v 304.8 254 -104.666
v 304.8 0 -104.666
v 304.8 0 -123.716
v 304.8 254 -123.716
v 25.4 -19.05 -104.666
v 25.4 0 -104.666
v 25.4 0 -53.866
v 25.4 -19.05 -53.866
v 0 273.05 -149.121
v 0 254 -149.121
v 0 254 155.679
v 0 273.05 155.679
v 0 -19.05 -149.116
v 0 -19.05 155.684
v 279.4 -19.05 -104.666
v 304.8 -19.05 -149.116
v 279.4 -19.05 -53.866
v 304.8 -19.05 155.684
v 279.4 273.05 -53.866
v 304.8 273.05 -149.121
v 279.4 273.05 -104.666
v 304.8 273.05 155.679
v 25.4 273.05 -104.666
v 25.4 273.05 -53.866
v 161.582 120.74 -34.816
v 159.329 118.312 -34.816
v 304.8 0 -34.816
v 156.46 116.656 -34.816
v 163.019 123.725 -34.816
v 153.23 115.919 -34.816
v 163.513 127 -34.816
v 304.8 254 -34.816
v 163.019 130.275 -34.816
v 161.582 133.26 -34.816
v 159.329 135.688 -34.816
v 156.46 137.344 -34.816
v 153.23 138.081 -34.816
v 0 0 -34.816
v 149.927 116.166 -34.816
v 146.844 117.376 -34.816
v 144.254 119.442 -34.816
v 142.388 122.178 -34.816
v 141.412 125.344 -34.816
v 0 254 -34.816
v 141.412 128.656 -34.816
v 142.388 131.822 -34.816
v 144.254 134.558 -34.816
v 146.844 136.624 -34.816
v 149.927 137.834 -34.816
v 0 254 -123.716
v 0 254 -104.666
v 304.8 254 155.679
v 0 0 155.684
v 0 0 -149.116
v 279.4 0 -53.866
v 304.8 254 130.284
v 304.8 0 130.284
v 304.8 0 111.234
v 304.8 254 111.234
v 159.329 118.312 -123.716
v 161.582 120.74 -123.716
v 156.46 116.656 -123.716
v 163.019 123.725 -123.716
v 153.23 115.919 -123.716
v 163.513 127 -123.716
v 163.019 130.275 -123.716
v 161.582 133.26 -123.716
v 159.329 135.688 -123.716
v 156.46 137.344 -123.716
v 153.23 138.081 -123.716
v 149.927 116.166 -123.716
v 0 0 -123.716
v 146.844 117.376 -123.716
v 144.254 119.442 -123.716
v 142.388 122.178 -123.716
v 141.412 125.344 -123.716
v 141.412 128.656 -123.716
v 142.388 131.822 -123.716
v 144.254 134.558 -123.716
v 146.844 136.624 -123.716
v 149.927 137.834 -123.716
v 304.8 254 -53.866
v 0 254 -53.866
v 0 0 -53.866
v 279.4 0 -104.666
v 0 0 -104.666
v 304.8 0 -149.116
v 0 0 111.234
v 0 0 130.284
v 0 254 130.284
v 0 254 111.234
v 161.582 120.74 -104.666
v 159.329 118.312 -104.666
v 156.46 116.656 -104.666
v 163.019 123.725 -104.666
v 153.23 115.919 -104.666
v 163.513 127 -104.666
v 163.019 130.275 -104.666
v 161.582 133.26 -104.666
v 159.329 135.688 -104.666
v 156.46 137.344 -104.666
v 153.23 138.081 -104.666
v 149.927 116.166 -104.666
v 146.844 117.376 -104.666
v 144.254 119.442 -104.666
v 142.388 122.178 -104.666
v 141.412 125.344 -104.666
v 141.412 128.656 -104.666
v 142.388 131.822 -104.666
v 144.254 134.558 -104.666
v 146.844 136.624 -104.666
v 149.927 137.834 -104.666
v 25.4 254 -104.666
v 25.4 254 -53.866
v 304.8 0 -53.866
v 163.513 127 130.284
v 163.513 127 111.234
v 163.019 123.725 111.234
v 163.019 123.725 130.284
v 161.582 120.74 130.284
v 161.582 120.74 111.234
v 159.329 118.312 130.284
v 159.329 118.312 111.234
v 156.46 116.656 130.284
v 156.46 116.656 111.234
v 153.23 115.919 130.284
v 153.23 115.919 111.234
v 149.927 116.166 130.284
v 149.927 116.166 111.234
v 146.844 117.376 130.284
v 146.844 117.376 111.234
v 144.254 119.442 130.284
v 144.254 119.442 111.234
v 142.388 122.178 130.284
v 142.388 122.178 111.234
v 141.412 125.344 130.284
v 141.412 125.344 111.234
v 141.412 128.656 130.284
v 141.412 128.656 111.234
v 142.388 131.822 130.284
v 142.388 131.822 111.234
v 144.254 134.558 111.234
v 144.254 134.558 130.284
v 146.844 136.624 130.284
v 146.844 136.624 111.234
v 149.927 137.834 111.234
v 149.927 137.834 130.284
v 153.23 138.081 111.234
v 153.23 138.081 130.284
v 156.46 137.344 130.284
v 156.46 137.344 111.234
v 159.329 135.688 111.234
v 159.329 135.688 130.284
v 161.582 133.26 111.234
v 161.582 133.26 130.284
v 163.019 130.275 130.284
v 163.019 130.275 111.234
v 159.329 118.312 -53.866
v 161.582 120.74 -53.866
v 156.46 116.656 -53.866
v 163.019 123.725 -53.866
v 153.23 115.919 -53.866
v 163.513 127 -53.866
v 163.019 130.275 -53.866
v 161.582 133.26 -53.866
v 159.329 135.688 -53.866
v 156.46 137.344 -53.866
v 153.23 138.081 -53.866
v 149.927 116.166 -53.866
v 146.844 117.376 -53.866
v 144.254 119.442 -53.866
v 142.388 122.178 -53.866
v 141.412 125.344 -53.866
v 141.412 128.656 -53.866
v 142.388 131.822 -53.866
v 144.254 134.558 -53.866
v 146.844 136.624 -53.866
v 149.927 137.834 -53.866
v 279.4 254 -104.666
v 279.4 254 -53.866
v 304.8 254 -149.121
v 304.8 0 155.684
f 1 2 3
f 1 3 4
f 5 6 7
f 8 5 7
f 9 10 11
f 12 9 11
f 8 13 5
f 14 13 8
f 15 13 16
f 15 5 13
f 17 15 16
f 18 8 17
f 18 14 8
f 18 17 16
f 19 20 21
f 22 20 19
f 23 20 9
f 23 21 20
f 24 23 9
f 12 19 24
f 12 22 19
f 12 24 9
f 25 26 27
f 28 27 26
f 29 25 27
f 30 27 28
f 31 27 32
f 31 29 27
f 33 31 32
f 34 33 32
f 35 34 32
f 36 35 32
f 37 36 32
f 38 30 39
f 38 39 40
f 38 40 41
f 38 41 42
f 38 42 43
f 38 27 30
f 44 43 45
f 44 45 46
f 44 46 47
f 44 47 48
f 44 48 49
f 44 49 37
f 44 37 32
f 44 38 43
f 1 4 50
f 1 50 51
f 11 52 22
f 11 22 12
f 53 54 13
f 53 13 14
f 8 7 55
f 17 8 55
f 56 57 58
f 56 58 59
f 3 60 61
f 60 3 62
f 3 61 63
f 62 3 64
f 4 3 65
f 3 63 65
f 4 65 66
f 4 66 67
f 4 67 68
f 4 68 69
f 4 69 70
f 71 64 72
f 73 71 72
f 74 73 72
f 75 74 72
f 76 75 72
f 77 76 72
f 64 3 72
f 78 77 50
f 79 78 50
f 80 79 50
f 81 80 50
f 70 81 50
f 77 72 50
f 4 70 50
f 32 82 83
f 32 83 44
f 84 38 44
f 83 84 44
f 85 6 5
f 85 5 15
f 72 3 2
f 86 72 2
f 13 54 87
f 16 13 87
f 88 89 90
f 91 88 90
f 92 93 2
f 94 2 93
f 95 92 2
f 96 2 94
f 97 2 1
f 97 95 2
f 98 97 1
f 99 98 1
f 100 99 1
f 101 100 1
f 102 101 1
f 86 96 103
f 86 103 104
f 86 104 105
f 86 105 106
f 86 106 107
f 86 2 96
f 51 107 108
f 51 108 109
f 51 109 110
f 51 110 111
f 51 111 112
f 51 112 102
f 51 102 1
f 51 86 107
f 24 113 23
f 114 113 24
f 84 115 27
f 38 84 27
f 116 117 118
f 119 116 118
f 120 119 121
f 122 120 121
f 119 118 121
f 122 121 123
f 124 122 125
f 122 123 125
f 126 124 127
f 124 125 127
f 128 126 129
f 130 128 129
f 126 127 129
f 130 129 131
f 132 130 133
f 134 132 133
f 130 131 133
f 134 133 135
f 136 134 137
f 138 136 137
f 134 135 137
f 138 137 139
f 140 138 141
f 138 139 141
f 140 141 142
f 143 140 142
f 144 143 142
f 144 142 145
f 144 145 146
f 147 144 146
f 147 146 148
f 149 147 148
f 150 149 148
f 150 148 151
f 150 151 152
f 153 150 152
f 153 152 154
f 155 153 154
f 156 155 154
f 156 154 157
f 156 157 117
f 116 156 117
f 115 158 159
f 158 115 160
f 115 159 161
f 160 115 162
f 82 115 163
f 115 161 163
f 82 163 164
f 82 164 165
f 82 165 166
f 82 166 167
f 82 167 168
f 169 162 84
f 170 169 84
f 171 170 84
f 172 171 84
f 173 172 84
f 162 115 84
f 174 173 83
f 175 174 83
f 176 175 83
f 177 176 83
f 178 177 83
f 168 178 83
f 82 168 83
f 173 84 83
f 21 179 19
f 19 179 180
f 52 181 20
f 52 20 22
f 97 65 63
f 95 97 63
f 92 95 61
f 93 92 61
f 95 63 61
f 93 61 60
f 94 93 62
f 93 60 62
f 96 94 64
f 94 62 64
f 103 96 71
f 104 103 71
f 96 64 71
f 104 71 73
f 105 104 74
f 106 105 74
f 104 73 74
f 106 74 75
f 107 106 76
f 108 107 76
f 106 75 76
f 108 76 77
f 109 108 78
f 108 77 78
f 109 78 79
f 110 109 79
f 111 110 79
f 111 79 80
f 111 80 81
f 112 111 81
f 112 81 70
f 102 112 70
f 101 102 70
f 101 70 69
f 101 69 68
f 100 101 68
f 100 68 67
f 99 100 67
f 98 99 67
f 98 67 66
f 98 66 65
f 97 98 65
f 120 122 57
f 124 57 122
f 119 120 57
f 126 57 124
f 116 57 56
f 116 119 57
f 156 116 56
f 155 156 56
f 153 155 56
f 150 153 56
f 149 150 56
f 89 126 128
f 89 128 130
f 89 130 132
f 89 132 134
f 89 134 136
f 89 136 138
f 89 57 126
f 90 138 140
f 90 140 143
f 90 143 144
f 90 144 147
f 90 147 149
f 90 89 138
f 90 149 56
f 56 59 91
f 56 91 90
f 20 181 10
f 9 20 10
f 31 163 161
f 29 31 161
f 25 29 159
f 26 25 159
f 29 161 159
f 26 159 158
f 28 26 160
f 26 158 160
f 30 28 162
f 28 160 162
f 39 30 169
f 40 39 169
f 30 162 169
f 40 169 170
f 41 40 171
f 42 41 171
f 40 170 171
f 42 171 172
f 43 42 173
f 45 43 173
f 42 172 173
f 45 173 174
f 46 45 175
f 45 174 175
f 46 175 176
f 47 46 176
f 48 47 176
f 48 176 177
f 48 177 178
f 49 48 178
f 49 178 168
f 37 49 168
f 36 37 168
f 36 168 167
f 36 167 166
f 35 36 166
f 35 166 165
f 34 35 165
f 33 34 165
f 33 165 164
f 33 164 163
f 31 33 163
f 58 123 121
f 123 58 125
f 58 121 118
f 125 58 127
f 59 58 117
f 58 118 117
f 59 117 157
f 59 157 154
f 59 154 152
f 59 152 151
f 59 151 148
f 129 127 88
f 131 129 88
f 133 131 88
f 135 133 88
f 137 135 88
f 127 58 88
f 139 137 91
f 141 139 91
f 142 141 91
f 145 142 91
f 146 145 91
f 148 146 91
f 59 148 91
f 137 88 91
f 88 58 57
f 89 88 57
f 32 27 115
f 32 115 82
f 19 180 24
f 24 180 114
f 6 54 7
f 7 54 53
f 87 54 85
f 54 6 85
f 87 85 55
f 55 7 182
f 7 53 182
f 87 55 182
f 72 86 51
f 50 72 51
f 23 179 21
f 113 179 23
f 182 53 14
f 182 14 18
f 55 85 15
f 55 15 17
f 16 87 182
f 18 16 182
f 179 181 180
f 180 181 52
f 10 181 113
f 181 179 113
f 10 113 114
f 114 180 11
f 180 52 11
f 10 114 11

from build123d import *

# Parameters (mm, degrees)
F0_W     = 254
F0_H     = 19.05
F1_DEPTH = 304.8
F3_W     = 304.8
F3_H     = 304.8
F3_W_2   = 254
F3_H_2   = 50.8
F5_DEPTH = 19.05
F6_W     = 304.8
F6_H     = 304.8
F6_W_2   = 254
F6_H_2   = 50.8
F7_DEPTH = 19.05
F8_R     = 11.1125
F9_DEPTH = 254


with BuildPart() as f1:
    # F0 (on Right) → F1 (new body)
    with BuildSketch(Plane.YZ):
        with Locations((127, 120.7588429924)):
            Rectangle(F0_W, F0_H)
    extrude(amount=F1_DEPTH)


with BuildPart() as f1b:
    # F0 (on Right) → F1, piece 2 (new body)
    with BuildSketch(Plane.YZ):
        with Locations((127, -44.3411570076)):
            Rectangle(F0_W, F0_H)
    extrude(amount=F1_DEPTH)


with BuildPart() as f1c:
    # F0 (on Right) → F1, piece 3 (new body)
    with BuildSketch(Plane.YZ):
        with Locations((127, -114.1911570076)):
            Rectangle(F0_W, F0_H)
    extrude(amount=F1_DEPTH)


with BuildPart() as f5:
    # F3 (on offset) → F5 (new body)
    with BuildSketch(Plane(origin=(0, 254, 0), x_dir=(-1, 0, 0), z_dir=(0, 1, 0))):
        with Locations((-152.4, 3.2794754744)):
            Rectangle(F3_W, F3_H)
        with Locations((-152.4, -79.2661570076)):
            Rectangle(F3_W_2, F3_H_2, mode=Mode.SUBTRACT)
    extrude(amount=F5_DEPTH)


with BuildPart() as f7:
    # F6 (on offset) → F7 (new body)
    with BuildSketch(Plane.XZ):
        with Locations((152.4, 3.2838429924)):
            Rectangle(F6_W, F6_H)
        with Locations((152.4, -79.2661570076)):
            Rectangle(F6_W_2, F6_H_2, mode=Mode.SUBTRACT)
    extrude(amount=F7_DEPTH)


with BuildPart() as f9_tool:
    # F8 (on face) → F9 (new body)
    with BuildSketch(Plane(origin=(0, 0, -123.7161570076), x_dir=(1, 0, 0), z_dir=(0, 0, -1))):
        with Locations((152.4, -127)):
            Circle(F8_R)
    extrude(amount=-F9_DEPTH)


with BuildPart() as f1_1:
    add(f1.part)

    # F9: cut by f9_tool
    add(f9_tool.part, mode=Mode.SUBTRACT)


with BuildPart() as f1b_1:
    add(f1b.part)

    # F9: cut by f9_tool
    add(f9_tool.part, mode=Mode.SUBTRACT)


with BuildPart() as f1c_1:
    add(f1c.part)

    # F9: cut by f9_tool
    add(f9_tool.part, mode=Mode.SUBTRACT)


solid = Compound([f5.part, f7.part, f1_1.part, f1b_1.part, f1c_1.part])
